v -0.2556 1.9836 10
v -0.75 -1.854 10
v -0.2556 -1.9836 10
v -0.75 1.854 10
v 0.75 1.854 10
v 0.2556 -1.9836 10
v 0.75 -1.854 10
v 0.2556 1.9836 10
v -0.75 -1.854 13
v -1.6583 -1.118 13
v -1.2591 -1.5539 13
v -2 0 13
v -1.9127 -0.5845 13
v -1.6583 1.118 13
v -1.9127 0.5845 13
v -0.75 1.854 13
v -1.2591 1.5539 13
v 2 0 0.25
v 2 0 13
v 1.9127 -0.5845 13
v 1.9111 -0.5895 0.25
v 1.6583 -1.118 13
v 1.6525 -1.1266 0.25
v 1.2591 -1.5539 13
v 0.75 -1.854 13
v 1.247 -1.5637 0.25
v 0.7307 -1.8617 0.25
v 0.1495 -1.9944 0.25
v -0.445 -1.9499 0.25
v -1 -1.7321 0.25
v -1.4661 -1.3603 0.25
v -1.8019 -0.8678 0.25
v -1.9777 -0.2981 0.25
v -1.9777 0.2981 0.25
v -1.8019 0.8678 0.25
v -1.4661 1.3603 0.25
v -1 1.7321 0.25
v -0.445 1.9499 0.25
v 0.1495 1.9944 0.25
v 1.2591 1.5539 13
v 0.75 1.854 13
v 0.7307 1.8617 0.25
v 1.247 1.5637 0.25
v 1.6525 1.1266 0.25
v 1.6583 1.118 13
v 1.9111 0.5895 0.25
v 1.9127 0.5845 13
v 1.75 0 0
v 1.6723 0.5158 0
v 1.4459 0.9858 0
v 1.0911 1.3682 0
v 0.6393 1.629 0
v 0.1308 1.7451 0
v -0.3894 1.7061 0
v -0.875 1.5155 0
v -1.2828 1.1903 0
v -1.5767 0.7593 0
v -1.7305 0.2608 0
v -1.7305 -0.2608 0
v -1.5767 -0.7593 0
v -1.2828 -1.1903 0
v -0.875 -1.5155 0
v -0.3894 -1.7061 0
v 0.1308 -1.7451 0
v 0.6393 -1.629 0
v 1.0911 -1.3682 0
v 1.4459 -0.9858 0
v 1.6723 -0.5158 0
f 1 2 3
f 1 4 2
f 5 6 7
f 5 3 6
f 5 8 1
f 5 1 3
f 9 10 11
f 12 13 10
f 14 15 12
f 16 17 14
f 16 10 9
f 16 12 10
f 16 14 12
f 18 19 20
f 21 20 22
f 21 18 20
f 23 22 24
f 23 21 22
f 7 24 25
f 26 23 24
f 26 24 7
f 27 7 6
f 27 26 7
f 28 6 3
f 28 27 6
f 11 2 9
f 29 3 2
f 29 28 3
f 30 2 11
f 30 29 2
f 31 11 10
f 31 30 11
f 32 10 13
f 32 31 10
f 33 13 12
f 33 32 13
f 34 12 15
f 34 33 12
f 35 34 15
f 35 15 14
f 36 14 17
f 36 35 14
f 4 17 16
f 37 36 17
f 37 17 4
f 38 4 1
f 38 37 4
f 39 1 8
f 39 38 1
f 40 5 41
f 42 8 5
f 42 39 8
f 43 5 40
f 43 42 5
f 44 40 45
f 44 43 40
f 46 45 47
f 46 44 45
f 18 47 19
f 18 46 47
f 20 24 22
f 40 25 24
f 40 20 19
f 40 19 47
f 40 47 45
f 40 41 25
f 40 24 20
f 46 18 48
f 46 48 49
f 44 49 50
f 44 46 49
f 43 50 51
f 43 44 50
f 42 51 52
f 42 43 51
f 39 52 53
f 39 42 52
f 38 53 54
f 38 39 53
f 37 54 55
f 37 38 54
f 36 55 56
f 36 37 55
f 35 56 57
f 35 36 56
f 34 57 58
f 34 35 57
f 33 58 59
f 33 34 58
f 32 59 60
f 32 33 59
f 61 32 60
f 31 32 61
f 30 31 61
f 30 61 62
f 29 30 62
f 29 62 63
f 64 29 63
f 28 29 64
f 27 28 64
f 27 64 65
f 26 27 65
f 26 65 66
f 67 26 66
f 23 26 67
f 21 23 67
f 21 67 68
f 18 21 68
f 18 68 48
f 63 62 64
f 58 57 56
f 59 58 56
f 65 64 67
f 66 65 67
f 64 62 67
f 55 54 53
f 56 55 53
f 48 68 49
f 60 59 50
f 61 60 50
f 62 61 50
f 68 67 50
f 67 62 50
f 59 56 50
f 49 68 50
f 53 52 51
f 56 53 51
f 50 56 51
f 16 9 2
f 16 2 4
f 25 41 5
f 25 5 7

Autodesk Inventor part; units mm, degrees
ref_plane "YZ Plane" through (0, 0, 0) normal (1, 0, 0) x (0, 1, 0)
ref_plane "XZ Plane" through (0, 0, 0) normal (0, 1, 0) x (-1, 0, 0)
ref_plane "XY Plane" through (0, 0, 0) normal (0, 0, 1) x (1, 0, 0)
sketch "草图1" plane through (0, 0, 0) normal (0, 0, 1) x (1, 0, 0)
  circle A0 centre (0, 0) radius 2
  dimension "d0" = 4
extrude "拉伸1" add sketch "草图1" along normal blind 13
sketch "草图2" plane through (0, 0, 13) normal (0, 0, 1) x (1, 0, 0)
  line L0 (-0.75, 2) -> (0.75, 2)
  line L1 (0.75, 2) -> (0.75, -2)
  line L2 (0.75, -2) -> (-0.75, -2)
  line L3 (-0.75, -2) -> (-0.75, 2)
  line L4 (0, 0) -> (0, 2)
  circle A0 centre (0, 0) radius 2 projected
  dimension "d3" = 1.5
extrude "拉伸2" cut sketch "草图2" against normal blind 3 contours L0 A0 L3 | L0 L1 A0 | A0 L1 L3 | A0 L2 L3 | L1 L2 A0
thread "螺纹1" size "M4x0.7" class "6g" standard "ANSI Metric M Profile" full length
chamfer "倒角1" distance 0.25 angle 45 1 edges at (-2, 0, 0)
properties part number "砂轮电机皮带轮固定螺丝"
